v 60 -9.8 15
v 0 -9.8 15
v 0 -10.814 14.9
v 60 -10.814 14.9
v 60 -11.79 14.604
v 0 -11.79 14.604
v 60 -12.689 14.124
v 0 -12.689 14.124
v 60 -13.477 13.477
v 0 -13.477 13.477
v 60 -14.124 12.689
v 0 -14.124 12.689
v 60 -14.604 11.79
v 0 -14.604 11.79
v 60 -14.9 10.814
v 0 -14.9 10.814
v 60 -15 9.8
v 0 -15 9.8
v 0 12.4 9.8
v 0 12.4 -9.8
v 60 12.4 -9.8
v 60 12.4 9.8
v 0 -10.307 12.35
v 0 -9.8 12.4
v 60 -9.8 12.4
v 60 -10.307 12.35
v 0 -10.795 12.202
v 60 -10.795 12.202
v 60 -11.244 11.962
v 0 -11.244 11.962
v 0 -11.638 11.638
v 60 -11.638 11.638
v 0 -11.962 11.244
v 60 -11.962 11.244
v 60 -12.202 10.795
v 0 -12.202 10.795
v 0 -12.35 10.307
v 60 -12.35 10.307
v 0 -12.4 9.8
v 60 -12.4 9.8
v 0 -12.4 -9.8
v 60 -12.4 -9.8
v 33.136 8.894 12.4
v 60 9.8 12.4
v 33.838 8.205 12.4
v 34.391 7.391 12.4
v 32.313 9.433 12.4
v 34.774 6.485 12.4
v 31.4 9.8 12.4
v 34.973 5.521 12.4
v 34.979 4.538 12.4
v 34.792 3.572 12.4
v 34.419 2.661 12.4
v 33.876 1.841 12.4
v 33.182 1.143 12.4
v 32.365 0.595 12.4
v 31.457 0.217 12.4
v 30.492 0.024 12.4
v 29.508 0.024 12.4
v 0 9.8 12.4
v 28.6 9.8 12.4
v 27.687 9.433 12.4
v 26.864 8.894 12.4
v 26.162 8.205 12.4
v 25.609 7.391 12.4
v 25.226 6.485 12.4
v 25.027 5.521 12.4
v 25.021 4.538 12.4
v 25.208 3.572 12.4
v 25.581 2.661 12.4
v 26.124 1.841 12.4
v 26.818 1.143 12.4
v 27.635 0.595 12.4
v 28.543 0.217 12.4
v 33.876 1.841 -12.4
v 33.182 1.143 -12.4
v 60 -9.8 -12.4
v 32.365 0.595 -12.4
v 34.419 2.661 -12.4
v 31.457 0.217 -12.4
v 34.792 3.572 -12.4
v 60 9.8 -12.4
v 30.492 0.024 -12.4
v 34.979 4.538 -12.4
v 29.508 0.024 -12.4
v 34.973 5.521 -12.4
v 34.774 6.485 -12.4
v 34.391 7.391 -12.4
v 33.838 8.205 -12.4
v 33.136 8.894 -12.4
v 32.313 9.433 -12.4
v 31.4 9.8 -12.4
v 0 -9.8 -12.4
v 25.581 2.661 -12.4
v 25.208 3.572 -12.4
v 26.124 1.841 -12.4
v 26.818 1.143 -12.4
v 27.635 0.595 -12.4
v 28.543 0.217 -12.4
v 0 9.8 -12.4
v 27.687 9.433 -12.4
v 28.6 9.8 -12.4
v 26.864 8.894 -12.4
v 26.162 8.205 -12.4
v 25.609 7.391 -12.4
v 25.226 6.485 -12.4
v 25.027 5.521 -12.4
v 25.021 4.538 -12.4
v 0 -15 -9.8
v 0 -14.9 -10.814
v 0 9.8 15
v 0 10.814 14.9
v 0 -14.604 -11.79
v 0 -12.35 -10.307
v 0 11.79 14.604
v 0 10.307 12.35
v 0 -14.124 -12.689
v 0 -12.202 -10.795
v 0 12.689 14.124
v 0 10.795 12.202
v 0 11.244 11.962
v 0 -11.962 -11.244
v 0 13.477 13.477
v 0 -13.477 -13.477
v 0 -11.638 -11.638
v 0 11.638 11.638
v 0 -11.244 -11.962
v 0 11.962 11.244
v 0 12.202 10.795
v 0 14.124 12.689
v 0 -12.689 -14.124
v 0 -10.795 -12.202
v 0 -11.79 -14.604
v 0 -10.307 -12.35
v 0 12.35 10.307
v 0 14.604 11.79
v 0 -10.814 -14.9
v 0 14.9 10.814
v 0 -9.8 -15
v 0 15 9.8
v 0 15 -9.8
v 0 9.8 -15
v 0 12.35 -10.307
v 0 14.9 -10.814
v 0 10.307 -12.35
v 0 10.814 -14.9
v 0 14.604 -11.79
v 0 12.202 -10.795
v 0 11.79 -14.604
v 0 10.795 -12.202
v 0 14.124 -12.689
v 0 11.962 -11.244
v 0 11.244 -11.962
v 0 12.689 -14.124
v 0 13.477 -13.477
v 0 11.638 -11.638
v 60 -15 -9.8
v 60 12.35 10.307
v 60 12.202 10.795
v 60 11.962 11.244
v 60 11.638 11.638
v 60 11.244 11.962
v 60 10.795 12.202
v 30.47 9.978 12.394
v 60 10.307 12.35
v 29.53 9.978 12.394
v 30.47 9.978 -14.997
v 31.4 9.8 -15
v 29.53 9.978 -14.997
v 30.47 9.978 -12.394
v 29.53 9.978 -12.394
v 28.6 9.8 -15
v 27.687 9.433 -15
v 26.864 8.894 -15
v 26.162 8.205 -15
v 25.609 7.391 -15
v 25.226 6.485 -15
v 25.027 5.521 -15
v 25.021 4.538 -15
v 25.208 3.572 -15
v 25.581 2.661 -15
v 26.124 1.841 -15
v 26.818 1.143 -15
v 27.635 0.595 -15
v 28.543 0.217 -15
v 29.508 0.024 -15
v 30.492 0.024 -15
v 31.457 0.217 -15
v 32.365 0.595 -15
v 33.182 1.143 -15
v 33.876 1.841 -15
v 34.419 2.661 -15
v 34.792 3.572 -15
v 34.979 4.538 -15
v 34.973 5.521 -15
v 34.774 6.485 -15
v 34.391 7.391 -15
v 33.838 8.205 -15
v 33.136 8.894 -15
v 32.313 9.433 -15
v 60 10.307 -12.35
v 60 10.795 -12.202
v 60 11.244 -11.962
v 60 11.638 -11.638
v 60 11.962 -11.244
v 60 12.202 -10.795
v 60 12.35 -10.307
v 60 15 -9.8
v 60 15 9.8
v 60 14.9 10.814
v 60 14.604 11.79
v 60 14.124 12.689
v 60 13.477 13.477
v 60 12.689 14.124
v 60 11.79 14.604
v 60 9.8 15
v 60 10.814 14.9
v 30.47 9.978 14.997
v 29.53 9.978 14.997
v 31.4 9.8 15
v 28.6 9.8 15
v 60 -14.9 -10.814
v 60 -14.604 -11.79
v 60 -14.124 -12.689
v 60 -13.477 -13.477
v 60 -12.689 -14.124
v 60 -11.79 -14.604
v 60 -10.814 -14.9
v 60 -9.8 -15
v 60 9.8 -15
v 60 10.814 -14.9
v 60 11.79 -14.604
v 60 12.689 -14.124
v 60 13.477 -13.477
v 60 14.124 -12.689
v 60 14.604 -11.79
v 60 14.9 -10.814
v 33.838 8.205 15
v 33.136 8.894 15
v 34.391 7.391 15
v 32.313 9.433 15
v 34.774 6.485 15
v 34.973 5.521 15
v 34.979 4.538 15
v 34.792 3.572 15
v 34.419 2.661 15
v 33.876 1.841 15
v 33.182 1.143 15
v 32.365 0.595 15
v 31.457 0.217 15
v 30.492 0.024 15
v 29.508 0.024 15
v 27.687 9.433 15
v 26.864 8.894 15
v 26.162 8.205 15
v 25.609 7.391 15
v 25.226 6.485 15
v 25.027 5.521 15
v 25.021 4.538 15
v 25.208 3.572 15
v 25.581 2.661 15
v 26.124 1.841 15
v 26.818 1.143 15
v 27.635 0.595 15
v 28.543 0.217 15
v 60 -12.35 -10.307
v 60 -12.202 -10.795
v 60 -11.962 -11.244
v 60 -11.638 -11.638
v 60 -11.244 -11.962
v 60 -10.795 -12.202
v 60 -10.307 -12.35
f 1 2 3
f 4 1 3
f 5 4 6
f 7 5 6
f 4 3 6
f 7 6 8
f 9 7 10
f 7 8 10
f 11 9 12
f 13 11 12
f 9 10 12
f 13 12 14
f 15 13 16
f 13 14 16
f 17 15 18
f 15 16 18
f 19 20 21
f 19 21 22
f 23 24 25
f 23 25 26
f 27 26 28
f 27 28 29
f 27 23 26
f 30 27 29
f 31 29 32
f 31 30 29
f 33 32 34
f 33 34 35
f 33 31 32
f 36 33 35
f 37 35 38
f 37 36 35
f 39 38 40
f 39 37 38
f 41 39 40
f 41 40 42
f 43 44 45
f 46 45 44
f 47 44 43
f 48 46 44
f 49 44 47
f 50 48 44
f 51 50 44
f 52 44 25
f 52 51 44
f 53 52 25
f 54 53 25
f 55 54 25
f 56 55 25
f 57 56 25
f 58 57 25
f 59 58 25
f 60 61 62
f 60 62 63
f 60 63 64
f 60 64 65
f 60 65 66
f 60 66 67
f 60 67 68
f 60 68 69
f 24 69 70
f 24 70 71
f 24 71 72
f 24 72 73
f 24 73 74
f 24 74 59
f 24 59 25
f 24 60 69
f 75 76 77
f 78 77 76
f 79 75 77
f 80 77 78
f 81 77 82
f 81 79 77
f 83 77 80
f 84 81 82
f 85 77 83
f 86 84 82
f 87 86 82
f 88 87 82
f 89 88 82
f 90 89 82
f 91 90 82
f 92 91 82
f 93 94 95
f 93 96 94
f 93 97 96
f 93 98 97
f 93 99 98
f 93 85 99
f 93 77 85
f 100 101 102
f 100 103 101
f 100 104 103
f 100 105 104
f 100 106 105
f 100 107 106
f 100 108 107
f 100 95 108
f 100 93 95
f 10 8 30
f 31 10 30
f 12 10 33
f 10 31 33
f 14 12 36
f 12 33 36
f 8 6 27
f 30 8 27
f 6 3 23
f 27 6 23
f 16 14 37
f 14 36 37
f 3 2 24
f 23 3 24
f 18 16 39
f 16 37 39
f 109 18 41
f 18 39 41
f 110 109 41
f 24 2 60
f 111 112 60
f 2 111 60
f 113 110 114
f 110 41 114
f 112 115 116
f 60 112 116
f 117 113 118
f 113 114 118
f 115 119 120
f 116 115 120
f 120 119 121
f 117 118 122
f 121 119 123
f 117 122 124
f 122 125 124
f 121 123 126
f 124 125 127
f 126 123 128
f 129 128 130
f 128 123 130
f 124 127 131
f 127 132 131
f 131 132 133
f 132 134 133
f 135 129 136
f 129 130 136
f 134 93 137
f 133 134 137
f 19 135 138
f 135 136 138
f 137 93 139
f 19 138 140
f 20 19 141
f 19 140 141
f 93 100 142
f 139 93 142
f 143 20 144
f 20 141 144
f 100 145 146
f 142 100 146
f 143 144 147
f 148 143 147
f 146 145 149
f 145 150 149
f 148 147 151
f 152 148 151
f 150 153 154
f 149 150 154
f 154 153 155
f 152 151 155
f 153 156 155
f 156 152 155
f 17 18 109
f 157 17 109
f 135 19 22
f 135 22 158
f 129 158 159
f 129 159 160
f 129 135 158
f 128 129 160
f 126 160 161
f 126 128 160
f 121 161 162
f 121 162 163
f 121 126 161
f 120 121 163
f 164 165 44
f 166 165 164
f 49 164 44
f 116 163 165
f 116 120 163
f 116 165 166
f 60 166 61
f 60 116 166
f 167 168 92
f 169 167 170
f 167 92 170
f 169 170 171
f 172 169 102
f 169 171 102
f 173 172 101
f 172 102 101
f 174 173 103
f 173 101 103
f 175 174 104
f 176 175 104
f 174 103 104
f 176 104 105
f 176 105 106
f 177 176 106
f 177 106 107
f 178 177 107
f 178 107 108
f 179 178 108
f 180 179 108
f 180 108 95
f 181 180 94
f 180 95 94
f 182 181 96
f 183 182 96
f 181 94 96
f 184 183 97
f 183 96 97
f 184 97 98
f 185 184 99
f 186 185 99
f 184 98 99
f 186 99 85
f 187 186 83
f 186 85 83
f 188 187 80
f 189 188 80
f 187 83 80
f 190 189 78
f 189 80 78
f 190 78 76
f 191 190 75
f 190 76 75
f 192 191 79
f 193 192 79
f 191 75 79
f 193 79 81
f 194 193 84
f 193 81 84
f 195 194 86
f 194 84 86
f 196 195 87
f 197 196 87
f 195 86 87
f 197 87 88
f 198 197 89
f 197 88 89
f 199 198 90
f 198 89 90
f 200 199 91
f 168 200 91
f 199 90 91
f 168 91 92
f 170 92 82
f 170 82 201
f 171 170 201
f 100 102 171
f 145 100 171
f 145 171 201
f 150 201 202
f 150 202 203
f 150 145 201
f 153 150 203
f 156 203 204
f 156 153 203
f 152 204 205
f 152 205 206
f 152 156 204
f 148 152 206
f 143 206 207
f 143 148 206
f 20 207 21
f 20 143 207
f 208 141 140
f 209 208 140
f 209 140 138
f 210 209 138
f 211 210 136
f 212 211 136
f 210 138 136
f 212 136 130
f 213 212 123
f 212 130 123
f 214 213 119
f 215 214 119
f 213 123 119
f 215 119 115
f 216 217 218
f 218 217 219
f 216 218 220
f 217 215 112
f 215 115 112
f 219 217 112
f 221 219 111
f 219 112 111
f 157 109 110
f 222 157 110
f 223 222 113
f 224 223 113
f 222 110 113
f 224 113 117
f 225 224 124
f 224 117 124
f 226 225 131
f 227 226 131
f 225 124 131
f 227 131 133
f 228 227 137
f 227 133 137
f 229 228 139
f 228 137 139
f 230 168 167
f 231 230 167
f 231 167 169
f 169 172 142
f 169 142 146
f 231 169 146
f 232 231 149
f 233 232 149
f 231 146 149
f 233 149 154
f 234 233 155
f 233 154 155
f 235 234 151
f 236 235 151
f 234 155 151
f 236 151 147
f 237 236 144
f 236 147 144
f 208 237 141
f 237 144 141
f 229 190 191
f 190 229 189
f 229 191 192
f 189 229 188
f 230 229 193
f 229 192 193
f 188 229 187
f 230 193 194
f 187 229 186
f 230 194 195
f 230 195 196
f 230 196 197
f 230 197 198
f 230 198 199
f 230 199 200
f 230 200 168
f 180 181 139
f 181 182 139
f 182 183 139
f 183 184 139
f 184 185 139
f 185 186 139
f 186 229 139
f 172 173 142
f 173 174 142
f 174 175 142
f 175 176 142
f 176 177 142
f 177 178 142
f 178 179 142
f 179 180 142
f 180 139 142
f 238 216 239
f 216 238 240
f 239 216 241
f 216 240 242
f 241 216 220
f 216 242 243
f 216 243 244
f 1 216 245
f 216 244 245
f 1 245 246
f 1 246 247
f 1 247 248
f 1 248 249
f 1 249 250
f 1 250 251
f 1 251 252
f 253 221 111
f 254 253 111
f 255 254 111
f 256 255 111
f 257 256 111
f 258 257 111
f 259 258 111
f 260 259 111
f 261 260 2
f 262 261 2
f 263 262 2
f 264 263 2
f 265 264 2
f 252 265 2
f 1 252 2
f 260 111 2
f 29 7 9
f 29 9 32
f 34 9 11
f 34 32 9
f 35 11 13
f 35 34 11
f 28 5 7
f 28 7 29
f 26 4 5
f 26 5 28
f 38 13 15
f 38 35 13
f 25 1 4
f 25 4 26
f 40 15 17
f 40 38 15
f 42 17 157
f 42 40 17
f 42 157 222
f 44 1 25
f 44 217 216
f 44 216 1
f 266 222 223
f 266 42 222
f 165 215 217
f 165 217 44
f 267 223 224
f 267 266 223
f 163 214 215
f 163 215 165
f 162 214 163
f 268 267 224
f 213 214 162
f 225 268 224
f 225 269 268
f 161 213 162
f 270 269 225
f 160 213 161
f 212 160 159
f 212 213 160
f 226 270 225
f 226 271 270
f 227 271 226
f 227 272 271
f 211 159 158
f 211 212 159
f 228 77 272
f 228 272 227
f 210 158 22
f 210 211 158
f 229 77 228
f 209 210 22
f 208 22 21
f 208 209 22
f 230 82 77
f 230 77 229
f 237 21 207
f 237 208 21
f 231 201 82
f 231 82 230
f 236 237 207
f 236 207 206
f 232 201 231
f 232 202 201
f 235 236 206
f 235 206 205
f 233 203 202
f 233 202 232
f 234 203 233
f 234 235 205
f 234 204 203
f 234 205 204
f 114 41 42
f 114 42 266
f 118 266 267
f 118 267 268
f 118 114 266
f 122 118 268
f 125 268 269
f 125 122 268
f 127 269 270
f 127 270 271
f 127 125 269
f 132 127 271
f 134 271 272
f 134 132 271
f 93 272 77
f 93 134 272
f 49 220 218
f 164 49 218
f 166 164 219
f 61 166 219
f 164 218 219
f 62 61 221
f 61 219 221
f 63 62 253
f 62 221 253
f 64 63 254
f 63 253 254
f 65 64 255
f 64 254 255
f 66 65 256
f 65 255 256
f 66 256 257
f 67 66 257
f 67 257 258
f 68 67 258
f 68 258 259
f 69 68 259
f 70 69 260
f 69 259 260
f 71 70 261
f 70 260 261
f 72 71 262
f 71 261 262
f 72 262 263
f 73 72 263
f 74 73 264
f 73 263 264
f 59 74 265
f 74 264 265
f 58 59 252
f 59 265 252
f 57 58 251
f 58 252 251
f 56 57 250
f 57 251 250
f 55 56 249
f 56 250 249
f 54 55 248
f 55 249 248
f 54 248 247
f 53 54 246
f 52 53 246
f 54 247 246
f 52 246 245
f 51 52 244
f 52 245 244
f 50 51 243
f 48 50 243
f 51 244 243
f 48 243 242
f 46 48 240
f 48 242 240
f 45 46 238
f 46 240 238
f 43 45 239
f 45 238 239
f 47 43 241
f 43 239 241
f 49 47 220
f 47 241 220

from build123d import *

# Parameters (mm, degrees)
RURA_KWADRATOWA_30_X_30_X_2_6_1_DEPTH = 60
SZKIC3_R                              = 5
WYTNIJ_WYCI_GNI_CIE1_DEPTH            = 69.738635424


with BuildPart() as part:
    # Sketch11 → Rura kwadratowa 30 X 30 X 2.6(1) (new body)
    with BuildSketch(Plane(origin=(0, 0, 0), x_dir=(0, 0, -1), z_dir=(1, 0, 0))):
        with BuildLine():
            Line((-9.8, -15), (9.8, -15))
            ThreePointArc((9.8, -15), (13.476955262, -13.476955262), (15, -9.8))
            Line((15, -9.8), (15, 9.8))
            ThreePointArc((15, 9.8), (13.476955262, 13.476955262), (9.8, 15))
            Line((9.8, 15), (-9.8, 15))
            ThreePointArc((-9.8, 15), (-13.476955262, 13.476955262), (-15, 9.8))
            Line((-15, 9.8), (-15, -9.8))
            ThreePointArc((-15, -9.8), (-13.476955262, -13.476955262), (-9.8, -15))
        make_face()
        with BuildLine():
            Line((-9.8, -12.4), (9.8, -12.4))
            ThreePointArc((9.8, -12.4), (11.638477631, -11.638477631), (12.4, -9.8))
            Line((12.4, -9.8), (12.4, 9.8))
            ThreePointArc((12.4, 9.8), (11.638477631, 11.638477631), (9.8, 12.4))
            Line((9.8, 12.4), (-9.8, 12.4))
            ThreePointArc((-9.8, 12.4), (-11.638477631, 11.638477631), (-12.4, 9.8))
            Line((-12.4, 9.8), (-12.4, -9.8))
            ThreePointArc((-12.4, -9.8), (-11.638477631, -11.638477631), (-9.8, -12.4))
        make_face(mode=Mode.SUBTRACT)
    extrude(amount=RURA_KWADRATOWA_30_X_30_X_2_6_1_DEPTH)

    # Szkic3 → Wytnij-wyciągnięcie1 (cut, through all)
    with BuildSketch(Plane.XY.offset(15)):
        with Locations(Location((30, 5, 0), (0, 0, 73.739795292))):
            Circle(SZKIC3_R)
    extrude(amount=-WYTNIJ_WYCI_GNI_CIE1_DEPTH, mode=Mode.SUBTRACT)


solid = part.part
